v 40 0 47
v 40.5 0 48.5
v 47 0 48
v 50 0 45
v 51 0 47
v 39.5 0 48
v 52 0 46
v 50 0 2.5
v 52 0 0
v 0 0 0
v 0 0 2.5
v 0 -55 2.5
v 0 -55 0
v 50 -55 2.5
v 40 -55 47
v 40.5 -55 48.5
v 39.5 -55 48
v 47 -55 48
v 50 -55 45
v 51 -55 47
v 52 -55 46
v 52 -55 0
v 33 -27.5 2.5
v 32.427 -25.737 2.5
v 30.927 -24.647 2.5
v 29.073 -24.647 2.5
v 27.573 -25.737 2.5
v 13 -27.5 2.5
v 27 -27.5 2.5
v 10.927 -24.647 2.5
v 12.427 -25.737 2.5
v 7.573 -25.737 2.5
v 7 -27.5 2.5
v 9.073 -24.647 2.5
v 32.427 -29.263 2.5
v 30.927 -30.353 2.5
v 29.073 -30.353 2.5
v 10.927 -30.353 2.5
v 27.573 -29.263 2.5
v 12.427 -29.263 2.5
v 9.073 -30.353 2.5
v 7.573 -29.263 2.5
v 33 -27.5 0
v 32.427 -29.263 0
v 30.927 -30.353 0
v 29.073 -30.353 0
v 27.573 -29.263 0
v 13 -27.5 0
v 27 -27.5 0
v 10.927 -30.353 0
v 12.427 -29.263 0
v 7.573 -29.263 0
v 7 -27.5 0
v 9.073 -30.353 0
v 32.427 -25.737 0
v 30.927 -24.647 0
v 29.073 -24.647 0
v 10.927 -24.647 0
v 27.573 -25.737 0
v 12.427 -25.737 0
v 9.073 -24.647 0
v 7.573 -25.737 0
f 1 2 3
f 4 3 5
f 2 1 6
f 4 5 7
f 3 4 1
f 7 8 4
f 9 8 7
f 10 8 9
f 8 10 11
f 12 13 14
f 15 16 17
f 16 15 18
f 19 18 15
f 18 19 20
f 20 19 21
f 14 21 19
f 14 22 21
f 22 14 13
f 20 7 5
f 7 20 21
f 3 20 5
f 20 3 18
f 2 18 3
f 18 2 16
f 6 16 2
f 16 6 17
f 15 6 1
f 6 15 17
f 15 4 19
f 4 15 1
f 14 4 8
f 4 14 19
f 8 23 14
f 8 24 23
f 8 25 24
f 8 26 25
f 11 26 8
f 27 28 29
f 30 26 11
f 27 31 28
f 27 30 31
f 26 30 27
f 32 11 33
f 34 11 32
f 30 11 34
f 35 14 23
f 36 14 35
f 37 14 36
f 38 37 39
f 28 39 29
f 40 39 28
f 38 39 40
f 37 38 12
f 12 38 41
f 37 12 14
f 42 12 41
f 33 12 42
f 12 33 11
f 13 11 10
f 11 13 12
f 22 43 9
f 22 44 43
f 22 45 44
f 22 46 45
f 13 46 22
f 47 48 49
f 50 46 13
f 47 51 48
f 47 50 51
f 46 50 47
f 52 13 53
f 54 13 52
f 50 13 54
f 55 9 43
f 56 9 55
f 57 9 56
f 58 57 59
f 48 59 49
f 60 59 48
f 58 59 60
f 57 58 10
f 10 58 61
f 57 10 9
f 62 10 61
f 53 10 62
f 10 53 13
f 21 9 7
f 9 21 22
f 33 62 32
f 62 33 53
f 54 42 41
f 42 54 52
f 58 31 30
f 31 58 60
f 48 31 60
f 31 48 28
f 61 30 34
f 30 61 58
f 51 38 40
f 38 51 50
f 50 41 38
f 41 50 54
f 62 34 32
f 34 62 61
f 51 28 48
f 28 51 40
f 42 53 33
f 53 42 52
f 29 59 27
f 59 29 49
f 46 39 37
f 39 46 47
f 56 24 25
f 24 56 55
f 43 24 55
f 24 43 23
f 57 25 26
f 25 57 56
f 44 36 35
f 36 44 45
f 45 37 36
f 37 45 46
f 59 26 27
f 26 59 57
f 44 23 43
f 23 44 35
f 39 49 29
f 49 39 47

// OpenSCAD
difference() {
    rotate([90,0,0])
    linear_extrude(55)
    polygon([[0,0],[0,2.5],[50,2.5],[50,45],[40,47],[39.5,48],[40.5,48.5],[47,48],[51,47],[52,46],[52,0]]);    

    
    translate([10,-27.5,-1])
    cylinder(r=3,h=4);

    translate([30,-27.5,-1])
    cylinder(r=3,h=4);
    
    
}
